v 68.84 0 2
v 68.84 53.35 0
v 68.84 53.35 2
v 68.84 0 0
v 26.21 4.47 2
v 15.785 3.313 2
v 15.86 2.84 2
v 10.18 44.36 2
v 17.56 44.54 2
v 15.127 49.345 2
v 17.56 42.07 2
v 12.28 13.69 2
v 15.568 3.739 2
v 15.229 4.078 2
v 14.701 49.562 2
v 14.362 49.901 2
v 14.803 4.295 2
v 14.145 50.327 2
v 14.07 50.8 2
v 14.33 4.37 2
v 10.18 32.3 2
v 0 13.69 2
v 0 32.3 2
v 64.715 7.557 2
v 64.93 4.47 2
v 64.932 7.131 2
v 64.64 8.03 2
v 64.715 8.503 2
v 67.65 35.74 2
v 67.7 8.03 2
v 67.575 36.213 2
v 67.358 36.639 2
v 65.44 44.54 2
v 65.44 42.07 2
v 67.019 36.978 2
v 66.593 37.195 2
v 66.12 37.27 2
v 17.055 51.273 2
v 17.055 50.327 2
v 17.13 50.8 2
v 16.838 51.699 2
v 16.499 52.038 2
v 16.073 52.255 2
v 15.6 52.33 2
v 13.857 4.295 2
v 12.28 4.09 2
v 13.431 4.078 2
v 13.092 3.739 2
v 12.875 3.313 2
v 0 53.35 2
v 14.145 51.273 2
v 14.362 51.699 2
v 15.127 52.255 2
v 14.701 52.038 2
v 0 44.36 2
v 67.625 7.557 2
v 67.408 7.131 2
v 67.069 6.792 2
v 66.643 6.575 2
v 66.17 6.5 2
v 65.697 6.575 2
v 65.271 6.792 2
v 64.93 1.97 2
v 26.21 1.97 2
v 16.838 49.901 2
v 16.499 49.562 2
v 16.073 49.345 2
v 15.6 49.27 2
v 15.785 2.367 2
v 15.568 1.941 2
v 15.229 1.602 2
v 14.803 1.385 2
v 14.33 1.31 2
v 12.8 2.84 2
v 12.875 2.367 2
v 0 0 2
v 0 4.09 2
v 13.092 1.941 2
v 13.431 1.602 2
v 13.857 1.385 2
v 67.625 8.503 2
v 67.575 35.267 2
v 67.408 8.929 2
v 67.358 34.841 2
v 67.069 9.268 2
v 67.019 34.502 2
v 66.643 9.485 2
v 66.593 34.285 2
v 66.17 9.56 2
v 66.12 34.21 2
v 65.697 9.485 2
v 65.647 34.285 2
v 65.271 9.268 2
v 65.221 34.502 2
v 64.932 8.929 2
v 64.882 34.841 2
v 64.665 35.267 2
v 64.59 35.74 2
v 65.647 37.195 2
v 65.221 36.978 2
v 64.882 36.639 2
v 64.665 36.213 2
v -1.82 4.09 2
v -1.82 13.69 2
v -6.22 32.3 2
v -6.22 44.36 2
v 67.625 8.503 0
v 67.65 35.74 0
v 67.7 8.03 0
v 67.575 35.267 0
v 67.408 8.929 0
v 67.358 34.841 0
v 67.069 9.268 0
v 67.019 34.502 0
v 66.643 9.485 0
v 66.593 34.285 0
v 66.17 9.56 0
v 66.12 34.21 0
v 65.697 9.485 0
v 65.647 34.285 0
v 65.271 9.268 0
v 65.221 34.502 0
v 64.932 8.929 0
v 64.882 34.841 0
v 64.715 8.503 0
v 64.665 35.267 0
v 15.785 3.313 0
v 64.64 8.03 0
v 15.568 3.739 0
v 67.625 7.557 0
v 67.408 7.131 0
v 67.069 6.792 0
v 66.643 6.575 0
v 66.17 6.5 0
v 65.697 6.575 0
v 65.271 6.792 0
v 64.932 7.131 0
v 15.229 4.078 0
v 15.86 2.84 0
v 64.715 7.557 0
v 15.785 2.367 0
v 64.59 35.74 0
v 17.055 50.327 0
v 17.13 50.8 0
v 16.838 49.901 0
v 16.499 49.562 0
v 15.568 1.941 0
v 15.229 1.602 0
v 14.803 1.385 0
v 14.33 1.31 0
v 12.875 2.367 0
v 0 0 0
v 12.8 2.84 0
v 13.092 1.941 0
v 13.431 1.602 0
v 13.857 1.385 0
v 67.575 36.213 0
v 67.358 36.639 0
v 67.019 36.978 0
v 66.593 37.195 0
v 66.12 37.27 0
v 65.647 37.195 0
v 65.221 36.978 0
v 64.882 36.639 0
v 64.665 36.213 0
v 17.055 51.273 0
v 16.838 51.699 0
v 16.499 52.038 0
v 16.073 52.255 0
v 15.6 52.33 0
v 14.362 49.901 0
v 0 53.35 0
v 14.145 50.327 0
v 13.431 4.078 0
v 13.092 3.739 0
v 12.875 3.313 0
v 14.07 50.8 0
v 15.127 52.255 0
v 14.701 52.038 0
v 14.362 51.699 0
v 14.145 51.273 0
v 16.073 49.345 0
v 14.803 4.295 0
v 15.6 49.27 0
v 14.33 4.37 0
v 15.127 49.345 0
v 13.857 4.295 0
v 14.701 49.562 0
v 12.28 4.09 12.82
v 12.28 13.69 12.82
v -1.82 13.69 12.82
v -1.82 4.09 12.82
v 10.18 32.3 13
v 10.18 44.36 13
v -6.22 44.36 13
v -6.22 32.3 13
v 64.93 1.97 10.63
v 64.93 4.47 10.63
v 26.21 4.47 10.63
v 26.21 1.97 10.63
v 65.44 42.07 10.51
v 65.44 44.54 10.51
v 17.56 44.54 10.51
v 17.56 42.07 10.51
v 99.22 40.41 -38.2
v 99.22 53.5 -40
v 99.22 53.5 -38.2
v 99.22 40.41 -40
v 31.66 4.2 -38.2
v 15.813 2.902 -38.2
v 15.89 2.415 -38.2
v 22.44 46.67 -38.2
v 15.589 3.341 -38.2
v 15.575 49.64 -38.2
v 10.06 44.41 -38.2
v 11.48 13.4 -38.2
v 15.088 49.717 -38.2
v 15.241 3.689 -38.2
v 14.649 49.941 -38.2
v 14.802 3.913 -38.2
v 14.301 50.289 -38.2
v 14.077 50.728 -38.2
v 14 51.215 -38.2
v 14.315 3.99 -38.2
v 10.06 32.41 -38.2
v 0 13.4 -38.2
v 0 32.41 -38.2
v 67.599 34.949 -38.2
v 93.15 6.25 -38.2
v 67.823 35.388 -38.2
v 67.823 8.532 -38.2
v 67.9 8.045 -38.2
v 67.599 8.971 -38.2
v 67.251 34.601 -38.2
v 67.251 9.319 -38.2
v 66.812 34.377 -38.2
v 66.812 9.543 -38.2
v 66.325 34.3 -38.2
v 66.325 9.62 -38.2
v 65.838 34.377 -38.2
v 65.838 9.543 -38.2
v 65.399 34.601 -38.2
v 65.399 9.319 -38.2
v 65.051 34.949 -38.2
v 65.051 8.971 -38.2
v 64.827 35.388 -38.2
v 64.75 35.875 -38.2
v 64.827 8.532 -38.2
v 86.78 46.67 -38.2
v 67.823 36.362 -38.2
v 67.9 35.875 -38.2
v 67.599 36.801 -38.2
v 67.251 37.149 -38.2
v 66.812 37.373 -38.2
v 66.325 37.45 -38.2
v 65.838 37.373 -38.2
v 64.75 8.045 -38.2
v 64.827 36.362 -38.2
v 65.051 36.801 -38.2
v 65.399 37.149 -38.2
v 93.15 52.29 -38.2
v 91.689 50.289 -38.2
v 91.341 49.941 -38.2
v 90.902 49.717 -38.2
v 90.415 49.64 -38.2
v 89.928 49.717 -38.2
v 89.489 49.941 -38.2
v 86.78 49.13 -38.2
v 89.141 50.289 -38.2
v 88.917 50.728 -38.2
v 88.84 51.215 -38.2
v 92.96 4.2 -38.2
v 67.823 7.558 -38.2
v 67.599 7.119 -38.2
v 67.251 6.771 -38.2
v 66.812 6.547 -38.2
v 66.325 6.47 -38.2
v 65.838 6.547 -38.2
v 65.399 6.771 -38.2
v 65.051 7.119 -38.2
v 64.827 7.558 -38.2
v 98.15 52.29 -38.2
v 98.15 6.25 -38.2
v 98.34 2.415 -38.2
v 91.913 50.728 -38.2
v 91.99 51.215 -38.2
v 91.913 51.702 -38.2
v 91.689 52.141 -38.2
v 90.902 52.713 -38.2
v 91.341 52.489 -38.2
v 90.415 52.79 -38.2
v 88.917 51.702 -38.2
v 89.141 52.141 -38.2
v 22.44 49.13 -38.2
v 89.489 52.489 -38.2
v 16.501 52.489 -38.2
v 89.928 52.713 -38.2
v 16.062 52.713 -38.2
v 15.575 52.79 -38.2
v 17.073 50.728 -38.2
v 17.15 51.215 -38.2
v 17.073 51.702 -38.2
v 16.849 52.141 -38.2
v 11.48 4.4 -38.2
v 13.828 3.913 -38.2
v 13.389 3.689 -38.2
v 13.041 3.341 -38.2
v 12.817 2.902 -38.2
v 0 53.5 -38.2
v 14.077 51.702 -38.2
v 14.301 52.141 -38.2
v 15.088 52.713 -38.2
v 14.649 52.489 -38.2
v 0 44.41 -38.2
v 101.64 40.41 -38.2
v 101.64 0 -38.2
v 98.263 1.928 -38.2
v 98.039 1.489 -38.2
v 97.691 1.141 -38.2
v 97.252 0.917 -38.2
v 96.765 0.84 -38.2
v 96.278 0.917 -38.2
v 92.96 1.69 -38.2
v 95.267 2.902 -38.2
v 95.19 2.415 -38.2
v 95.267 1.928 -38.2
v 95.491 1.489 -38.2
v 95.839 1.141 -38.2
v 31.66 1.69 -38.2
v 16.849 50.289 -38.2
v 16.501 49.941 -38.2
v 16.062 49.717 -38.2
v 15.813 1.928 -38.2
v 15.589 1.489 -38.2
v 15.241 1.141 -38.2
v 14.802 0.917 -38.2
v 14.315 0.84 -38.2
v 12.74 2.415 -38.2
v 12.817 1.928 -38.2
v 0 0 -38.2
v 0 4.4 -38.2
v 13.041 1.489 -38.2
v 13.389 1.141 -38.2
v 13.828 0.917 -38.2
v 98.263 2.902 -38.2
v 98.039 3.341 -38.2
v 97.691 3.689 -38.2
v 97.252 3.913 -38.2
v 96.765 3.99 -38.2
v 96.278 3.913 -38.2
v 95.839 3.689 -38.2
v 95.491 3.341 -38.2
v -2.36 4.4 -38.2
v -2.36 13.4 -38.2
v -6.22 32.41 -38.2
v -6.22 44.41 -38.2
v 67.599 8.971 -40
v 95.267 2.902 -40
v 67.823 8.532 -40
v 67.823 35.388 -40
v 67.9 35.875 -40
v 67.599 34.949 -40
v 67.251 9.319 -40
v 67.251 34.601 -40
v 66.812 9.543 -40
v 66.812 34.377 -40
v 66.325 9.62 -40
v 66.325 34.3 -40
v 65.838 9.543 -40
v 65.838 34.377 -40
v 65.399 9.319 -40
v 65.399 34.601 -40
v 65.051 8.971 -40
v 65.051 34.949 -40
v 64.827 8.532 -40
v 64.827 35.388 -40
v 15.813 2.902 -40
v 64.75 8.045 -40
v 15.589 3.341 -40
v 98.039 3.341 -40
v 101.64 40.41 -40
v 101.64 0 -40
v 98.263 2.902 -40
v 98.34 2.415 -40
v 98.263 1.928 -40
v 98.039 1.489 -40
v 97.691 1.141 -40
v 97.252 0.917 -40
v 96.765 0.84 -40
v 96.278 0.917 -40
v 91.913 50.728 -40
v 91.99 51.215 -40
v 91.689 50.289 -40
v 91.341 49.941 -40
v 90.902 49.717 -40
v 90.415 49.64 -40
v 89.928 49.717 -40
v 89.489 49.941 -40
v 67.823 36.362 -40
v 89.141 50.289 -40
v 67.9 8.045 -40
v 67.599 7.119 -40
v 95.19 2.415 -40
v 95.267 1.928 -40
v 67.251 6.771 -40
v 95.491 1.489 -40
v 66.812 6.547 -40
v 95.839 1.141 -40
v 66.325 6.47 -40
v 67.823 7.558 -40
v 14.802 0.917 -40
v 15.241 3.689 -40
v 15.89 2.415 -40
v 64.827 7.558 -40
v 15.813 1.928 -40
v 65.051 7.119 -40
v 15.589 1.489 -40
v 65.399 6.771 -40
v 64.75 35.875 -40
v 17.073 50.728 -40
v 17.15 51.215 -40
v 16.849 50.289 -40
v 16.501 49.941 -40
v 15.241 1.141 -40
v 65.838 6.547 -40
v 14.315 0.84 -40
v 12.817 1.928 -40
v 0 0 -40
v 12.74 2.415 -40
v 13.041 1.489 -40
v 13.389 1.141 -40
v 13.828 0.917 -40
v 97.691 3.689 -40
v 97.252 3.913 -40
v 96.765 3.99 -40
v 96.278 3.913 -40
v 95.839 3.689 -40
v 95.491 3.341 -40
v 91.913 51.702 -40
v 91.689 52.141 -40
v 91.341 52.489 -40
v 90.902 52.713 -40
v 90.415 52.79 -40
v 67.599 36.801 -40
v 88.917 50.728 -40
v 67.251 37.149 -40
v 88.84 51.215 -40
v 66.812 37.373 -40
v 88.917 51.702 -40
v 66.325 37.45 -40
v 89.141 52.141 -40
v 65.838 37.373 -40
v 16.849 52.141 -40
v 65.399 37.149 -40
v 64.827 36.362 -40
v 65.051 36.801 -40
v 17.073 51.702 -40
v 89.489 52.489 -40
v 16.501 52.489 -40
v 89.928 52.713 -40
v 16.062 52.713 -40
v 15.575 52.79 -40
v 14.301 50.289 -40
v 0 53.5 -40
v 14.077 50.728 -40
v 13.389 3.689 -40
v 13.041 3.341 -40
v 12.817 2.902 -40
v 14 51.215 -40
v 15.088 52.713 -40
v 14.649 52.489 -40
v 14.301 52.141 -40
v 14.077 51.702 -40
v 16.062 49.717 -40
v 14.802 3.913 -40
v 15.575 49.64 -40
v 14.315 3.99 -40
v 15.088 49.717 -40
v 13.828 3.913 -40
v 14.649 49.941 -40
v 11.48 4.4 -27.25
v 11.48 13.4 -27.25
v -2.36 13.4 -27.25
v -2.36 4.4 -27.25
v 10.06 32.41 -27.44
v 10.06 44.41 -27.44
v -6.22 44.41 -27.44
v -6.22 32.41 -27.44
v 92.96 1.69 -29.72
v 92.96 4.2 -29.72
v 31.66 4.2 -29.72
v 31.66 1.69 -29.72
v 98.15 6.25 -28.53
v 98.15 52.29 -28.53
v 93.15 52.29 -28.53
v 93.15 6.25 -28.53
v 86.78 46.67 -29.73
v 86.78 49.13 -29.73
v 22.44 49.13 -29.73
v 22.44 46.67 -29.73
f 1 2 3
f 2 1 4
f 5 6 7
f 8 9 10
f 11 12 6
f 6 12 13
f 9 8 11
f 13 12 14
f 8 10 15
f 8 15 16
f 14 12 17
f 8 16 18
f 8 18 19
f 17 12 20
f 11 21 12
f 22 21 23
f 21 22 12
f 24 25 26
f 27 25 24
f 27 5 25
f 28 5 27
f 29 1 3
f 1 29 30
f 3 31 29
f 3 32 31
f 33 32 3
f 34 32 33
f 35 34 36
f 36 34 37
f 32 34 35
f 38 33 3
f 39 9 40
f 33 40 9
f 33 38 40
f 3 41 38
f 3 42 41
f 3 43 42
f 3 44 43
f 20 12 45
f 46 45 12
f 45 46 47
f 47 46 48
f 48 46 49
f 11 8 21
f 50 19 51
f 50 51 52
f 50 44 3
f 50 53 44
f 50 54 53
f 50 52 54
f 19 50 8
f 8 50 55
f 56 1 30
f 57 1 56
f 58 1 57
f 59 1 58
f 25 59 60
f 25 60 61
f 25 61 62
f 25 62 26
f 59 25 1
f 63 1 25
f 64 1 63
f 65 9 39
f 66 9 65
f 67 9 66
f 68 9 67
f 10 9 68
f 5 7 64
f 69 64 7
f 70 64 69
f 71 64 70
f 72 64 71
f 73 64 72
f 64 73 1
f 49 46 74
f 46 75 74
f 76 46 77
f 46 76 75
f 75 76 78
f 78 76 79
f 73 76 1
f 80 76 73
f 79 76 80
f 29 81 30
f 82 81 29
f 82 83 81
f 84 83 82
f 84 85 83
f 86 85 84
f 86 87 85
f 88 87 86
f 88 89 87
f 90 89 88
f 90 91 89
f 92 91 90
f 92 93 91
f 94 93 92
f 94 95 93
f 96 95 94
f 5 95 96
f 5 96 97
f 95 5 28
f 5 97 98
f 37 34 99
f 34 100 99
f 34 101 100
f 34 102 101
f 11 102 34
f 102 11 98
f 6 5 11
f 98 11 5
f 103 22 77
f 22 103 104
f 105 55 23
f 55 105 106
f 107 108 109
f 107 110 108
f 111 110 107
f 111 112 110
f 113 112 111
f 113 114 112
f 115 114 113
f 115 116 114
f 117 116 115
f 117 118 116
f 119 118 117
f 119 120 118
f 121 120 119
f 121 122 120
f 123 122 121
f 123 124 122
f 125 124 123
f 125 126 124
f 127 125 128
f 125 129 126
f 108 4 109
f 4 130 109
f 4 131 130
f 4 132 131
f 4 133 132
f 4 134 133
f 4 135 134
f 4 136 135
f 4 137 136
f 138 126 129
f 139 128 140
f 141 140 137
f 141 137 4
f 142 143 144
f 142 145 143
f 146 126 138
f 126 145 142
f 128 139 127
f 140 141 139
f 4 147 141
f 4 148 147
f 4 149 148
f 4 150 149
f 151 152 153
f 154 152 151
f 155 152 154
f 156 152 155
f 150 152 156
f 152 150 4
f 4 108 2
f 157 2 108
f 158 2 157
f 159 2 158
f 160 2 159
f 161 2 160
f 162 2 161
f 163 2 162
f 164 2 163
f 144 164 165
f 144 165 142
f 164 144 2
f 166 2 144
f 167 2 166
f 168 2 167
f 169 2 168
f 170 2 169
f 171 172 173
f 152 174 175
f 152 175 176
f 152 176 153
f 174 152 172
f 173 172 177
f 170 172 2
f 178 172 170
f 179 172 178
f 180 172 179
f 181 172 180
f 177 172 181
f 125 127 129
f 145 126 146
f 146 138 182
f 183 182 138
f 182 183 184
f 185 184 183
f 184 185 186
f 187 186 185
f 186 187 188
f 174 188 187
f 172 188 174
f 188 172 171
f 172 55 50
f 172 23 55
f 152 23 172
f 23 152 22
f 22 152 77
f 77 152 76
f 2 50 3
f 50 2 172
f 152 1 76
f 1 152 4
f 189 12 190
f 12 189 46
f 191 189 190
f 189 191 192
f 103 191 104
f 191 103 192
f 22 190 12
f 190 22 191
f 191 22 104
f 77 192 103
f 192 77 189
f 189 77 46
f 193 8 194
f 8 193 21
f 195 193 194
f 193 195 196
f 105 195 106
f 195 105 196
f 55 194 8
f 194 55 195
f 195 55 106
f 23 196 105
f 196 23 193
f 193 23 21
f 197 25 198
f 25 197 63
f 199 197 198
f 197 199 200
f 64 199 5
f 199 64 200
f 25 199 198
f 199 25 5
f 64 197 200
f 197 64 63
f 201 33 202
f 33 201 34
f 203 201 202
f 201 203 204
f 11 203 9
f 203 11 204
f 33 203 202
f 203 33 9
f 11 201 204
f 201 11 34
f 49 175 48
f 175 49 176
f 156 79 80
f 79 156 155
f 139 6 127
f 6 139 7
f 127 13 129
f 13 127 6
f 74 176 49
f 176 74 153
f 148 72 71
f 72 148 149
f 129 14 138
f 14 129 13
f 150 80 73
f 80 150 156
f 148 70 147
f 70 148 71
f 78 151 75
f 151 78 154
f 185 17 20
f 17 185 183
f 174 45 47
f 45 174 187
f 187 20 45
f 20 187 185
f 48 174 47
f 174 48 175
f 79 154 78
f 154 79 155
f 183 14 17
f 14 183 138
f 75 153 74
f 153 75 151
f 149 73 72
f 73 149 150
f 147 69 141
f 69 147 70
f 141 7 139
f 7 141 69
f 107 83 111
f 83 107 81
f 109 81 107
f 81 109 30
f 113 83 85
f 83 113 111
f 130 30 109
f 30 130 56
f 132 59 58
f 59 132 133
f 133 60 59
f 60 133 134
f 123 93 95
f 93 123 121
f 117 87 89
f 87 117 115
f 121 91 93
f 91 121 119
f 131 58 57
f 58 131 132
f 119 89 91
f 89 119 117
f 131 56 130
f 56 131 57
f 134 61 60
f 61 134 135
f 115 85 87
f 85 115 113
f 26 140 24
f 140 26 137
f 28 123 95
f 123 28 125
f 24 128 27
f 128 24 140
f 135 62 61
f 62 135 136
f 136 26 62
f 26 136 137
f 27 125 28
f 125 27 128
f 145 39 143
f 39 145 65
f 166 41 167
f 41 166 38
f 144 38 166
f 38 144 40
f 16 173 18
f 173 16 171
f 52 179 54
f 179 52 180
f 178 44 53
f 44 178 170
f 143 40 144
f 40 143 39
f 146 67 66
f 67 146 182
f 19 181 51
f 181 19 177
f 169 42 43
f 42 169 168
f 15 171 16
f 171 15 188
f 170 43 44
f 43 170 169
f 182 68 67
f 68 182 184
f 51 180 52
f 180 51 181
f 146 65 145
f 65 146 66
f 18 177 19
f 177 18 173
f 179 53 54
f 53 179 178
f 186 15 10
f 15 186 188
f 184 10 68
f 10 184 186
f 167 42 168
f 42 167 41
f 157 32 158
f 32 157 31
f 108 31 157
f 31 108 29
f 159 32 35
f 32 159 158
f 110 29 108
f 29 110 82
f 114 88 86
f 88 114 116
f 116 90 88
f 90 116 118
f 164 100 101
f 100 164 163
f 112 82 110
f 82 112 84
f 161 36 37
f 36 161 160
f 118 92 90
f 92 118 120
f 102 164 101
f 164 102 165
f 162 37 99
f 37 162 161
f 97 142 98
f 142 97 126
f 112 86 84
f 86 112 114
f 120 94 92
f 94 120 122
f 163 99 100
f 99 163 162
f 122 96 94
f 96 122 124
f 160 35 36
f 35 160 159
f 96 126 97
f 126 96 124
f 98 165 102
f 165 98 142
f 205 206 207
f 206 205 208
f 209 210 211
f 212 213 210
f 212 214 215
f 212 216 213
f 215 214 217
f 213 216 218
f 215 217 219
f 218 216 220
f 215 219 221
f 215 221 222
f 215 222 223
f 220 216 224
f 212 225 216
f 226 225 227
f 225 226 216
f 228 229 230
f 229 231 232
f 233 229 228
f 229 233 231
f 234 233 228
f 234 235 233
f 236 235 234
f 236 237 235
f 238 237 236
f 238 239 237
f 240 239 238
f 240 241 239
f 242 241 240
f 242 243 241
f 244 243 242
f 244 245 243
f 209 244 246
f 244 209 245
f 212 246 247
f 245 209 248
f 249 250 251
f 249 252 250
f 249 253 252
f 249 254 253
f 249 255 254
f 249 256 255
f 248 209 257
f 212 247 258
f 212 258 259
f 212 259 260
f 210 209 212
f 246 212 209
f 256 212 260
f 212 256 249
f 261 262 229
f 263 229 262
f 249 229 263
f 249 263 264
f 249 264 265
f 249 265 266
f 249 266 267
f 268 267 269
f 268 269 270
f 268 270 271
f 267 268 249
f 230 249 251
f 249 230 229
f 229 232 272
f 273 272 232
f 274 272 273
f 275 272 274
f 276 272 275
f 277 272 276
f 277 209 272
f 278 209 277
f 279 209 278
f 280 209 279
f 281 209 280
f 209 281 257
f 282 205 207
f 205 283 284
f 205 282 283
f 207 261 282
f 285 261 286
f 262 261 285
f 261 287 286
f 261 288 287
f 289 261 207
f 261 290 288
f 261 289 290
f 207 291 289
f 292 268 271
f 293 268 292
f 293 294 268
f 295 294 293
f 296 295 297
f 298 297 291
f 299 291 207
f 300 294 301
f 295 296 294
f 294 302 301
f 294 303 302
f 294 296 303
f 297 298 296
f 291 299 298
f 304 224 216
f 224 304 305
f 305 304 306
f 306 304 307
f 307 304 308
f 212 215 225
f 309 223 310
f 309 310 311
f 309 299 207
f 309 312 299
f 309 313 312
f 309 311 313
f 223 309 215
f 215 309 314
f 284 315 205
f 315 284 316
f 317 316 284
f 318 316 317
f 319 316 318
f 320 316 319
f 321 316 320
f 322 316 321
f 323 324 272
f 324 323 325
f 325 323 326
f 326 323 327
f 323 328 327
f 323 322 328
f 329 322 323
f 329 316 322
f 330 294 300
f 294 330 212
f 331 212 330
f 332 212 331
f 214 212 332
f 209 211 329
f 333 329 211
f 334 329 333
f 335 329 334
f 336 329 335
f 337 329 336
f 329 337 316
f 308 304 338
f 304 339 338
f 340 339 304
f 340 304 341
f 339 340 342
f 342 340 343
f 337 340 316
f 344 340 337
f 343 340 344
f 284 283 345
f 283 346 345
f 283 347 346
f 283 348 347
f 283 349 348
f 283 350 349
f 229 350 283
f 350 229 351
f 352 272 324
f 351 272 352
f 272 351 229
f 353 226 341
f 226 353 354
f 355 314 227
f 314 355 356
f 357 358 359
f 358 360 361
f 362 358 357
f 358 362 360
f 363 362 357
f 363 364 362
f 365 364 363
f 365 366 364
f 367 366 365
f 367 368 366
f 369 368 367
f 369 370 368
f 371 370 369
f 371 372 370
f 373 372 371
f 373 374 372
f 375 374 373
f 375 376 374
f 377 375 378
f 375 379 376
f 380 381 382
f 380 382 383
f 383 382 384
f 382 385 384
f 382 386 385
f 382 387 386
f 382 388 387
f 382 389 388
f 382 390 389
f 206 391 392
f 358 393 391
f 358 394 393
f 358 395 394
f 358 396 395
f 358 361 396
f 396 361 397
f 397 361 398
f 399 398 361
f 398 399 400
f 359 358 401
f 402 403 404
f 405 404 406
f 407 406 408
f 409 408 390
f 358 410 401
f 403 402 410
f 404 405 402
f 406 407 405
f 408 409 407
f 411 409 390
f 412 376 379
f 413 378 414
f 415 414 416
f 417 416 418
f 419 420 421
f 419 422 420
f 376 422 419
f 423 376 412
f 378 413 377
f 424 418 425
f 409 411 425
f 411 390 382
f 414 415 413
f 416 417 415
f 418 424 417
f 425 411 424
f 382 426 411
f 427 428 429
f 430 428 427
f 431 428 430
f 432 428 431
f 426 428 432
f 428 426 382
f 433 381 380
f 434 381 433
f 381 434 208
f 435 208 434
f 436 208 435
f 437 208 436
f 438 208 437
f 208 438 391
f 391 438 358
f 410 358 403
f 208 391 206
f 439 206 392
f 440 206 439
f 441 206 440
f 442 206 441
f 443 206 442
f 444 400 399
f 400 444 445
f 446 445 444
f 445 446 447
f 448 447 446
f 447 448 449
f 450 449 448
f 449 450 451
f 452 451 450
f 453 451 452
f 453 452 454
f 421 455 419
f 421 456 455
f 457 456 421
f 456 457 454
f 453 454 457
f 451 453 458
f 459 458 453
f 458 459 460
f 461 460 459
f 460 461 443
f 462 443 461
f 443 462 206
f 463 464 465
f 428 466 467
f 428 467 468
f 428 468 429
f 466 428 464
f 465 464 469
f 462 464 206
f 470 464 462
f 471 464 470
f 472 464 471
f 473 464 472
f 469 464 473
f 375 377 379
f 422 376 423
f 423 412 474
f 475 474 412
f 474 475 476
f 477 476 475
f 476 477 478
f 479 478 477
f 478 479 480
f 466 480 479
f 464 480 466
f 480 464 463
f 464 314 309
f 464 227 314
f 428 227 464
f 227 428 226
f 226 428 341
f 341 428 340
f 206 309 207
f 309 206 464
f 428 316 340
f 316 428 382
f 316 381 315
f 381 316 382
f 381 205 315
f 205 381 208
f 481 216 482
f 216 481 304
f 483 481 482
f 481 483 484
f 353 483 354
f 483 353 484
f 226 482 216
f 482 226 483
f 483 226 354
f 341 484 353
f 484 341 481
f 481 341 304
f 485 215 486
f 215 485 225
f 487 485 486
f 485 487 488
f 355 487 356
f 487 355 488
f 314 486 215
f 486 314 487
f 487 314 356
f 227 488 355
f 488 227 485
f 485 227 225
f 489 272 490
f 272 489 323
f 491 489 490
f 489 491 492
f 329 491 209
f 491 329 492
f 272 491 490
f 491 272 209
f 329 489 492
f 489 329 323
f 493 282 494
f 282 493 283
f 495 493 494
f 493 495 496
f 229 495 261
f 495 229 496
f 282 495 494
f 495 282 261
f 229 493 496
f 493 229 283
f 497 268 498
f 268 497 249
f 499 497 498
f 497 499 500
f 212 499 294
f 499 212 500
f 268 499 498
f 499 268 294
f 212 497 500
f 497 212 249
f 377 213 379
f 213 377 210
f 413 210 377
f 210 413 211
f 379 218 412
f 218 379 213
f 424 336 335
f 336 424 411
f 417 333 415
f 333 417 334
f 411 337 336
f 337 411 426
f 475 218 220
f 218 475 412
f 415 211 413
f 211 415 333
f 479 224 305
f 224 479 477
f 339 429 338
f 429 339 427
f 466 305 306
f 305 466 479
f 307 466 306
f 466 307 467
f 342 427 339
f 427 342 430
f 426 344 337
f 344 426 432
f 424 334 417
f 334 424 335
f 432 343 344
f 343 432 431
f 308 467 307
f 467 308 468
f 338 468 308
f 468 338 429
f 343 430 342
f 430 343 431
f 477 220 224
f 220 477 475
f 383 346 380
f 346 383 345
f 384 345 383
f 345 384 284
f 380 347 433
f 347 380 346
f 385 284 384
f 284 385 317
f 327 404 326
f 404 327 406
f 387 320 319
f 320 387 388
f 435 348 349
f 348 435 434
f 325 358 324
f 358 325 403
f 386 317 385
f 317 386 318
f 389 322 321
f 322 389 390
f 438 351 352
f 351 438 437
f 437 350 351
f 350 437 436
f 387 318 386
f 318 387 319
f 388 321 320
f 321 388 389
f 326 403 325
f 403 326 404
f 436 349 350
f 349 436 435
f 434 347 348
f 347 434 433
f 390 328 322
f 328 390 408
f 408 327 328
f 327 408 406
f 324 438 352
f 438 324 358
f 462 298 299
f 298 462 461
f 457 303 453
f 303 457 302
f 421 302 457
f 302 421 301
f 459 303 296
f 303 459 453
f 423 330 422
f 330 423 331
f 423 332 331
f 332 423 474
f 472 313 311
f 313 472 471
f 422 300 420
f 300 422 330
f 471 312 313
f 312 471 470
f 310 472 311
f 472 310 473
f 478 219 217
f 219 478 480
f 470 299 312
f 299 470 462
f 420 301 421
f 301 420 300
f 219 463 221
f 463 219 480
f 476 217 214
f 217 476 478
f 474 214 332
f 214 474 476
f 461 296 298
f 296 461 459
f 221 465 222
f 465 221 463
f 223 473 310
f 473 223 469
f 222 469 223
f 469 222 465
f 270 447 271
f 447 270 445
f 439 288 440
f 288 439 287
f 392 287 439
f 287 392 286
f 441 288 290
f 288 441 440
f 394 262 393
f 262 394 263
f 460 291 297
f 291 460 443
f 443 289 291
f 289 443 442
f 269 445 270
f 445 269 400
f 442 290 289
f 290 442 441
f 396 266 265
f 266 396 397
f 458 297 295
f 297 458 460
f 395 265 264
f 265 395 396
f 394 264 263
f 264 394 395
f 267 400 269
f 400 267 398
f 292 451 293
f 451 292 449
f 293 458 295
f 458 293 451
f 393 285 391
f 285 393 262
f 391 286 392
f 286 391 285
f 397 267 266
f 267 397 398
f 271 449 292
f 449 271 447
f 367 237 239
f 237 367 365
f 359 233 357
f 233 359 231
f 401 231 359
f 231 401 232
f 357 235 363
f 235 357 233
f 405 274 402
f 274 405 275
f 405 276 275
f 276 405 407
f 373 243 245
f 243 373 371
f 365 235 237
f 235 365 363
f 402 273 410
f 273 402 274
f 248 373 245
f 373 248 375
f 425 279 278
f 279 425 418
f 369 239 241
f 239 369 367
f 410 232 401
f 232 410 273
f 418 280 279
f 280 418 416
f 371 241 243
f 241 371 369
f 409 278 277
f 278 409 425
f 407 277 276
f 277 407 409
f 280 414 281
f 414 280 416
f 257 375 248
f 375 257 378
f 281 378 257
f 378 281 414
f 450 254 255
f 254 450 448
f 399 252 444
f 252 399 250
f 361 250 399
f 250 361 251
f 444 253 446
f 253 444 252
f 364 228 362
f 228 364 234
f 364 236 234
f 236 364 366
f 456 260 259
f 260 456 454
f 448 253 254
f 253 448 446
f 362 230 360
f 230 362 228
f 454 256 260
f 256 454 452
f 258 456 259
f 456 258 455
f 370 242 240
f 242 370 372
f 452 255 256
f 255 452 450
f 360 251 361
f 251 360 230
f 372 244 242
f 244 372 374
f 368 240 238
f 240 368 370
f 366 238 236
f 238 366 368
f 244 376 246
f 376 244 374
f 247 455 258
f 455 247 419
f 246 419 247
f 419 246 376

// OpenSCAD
// file: bbs_pins.scad
//
// A pin header with 0.1 inch spacing
//
pitch = 2.54;

module bbs_header(pins)
{
    for (i = [1 : pins])
    {
        translate([(i-1)*pitch, 0, -9]) cylinder(h=11.57, r=0.5);
        translate([(i-1)*pitch, 0, -9 + 5.93]) cylinder(h=2.27, r=1.5);
    }
}

bbs_header(10);
// main file
//
// Modules for Arduinos.
//
use <bbs_pins.scad>

//--------------------------------------------------------------------------------------
// This is a model for the basic Arduino Uno.  The standoff model will probably work
// for any of the other small Arduino boards.
//
module bbs_arduino_uno()
{
    hole_rad = 3.06/2;
    difference()
    {
        union()
        {
            cube([68.84, 53.35, 2]);
            translate([-1.82, 4.09, 2]) cube([14.10, 9.60, 10.82]); // power connector
            translate([-6.22, 32.30, 2]) cube([16.40, 12.06, 11.00]); // USB connector
            translate([26.21, 1.97, 2]) cube([38.72, 2.50, 8.63]); // connector
            translate([17.56, 42.07, 2]) cube([47.88, 2.47, 8.51]); // connector
        }
        bbs_arduino_uno_standoffs(2.2, hole_rad, 20);
    }
}
//
// Standoffs for Arduino Uno.  This should also work for other small board Arduinos.
//
module bbs_arduino_uno_standoffs(height, radius, facets)
{
    hole_rad = 3.06/2;
    union()
    {
        translate([12.80 + hole_rad, 1.31 + hole_rad, 0]) cylinder(r=radius, h = height, $fn=facets);
        translate([64.64 + hole_rad, 6.50 + hole_rad, 0]) cylinder(r=radius, h = height, $fn=facets);
        translate([14.07 + hole_rad, 49.27 + hole_rad, 0]) cylinder(r=radius, h = height, $fn=facets);
        translate([64.59 + hole_rad, 34.21 + hole_rad, 0]) cylinder(r=radius, h = height, $fn=facets);
    }
}


//--------------------------------------------------------------------------------------
module bbs_arduino_mega2560()
{
    hole_rad = 3.15/2;
    difference()
    {
        union()
        {
            cube([99.22, 53.5, 1.8]);
            cube([101.64, 40.41, 1.8]);
            translate([-2.36, 4.40, 1.8]) cube([13.84, 9, 10.95]); // power connector
            translate([-6.22, 32.41, 1.8]) cube([16.28, 12, 10.76]); // USB connector
            translate([31.66, 1.69, 1.8]) cube([61.3, 2.51, 8.48]); // connectors
            translate([93.15, 6.25, 1.8]) cube([5, 46.04, 9.67]); // connectors
            translate([22.44, 46.67, 1.8]) cube([64.34, 2.46, 8.47]); // connectors
        }
        translate([0, 0, -0.1]) bbs_arduino_mega2560_standoffs(2, hole_rad, 20);
    }
}
//
// The standoff pattern also works for the Arduino Due and will probably work for the Mega
// as well.
//
module bbs_arduino_mega2560_standoffs(height, radius, facets)
{
    hole_rad = 3.15/2;
    union()
    {
        translate([12.74 + hole_rad, 0.84 + hole_rad, 0]) cylinder(r=radius, h = height, $fn=facets);
        translate([95.19 + hole_rad, 0.84 + hole_rad, 0]) cylinder(r=radius, h = height, $fn=facets);
        translate([14 + hole_rad, 49.64 + hole_rad, 0]) cylinder(r=radius, h = height, $fn=facets);
        translate([88.84 + hole_rad, 49.64 + hole_rad, 0]) cylinder(r=radius, h = height, $fn=facets);
        translate([64.75 + hole_rad, 6.47 + hole_rad, 0]) cylinder(r=radius, h = height, $fn=facets);
        translate([64.75 + hole_rad, 34.30 + hole_rad, 0]) cylinder(r=radius, h = height, $fn=facets);
    }
}
//--------------------------------------------------------------------------------------
bbs_arduino_uno();

translate([0, 0, -40]) bbs_arduino_mega2560();
